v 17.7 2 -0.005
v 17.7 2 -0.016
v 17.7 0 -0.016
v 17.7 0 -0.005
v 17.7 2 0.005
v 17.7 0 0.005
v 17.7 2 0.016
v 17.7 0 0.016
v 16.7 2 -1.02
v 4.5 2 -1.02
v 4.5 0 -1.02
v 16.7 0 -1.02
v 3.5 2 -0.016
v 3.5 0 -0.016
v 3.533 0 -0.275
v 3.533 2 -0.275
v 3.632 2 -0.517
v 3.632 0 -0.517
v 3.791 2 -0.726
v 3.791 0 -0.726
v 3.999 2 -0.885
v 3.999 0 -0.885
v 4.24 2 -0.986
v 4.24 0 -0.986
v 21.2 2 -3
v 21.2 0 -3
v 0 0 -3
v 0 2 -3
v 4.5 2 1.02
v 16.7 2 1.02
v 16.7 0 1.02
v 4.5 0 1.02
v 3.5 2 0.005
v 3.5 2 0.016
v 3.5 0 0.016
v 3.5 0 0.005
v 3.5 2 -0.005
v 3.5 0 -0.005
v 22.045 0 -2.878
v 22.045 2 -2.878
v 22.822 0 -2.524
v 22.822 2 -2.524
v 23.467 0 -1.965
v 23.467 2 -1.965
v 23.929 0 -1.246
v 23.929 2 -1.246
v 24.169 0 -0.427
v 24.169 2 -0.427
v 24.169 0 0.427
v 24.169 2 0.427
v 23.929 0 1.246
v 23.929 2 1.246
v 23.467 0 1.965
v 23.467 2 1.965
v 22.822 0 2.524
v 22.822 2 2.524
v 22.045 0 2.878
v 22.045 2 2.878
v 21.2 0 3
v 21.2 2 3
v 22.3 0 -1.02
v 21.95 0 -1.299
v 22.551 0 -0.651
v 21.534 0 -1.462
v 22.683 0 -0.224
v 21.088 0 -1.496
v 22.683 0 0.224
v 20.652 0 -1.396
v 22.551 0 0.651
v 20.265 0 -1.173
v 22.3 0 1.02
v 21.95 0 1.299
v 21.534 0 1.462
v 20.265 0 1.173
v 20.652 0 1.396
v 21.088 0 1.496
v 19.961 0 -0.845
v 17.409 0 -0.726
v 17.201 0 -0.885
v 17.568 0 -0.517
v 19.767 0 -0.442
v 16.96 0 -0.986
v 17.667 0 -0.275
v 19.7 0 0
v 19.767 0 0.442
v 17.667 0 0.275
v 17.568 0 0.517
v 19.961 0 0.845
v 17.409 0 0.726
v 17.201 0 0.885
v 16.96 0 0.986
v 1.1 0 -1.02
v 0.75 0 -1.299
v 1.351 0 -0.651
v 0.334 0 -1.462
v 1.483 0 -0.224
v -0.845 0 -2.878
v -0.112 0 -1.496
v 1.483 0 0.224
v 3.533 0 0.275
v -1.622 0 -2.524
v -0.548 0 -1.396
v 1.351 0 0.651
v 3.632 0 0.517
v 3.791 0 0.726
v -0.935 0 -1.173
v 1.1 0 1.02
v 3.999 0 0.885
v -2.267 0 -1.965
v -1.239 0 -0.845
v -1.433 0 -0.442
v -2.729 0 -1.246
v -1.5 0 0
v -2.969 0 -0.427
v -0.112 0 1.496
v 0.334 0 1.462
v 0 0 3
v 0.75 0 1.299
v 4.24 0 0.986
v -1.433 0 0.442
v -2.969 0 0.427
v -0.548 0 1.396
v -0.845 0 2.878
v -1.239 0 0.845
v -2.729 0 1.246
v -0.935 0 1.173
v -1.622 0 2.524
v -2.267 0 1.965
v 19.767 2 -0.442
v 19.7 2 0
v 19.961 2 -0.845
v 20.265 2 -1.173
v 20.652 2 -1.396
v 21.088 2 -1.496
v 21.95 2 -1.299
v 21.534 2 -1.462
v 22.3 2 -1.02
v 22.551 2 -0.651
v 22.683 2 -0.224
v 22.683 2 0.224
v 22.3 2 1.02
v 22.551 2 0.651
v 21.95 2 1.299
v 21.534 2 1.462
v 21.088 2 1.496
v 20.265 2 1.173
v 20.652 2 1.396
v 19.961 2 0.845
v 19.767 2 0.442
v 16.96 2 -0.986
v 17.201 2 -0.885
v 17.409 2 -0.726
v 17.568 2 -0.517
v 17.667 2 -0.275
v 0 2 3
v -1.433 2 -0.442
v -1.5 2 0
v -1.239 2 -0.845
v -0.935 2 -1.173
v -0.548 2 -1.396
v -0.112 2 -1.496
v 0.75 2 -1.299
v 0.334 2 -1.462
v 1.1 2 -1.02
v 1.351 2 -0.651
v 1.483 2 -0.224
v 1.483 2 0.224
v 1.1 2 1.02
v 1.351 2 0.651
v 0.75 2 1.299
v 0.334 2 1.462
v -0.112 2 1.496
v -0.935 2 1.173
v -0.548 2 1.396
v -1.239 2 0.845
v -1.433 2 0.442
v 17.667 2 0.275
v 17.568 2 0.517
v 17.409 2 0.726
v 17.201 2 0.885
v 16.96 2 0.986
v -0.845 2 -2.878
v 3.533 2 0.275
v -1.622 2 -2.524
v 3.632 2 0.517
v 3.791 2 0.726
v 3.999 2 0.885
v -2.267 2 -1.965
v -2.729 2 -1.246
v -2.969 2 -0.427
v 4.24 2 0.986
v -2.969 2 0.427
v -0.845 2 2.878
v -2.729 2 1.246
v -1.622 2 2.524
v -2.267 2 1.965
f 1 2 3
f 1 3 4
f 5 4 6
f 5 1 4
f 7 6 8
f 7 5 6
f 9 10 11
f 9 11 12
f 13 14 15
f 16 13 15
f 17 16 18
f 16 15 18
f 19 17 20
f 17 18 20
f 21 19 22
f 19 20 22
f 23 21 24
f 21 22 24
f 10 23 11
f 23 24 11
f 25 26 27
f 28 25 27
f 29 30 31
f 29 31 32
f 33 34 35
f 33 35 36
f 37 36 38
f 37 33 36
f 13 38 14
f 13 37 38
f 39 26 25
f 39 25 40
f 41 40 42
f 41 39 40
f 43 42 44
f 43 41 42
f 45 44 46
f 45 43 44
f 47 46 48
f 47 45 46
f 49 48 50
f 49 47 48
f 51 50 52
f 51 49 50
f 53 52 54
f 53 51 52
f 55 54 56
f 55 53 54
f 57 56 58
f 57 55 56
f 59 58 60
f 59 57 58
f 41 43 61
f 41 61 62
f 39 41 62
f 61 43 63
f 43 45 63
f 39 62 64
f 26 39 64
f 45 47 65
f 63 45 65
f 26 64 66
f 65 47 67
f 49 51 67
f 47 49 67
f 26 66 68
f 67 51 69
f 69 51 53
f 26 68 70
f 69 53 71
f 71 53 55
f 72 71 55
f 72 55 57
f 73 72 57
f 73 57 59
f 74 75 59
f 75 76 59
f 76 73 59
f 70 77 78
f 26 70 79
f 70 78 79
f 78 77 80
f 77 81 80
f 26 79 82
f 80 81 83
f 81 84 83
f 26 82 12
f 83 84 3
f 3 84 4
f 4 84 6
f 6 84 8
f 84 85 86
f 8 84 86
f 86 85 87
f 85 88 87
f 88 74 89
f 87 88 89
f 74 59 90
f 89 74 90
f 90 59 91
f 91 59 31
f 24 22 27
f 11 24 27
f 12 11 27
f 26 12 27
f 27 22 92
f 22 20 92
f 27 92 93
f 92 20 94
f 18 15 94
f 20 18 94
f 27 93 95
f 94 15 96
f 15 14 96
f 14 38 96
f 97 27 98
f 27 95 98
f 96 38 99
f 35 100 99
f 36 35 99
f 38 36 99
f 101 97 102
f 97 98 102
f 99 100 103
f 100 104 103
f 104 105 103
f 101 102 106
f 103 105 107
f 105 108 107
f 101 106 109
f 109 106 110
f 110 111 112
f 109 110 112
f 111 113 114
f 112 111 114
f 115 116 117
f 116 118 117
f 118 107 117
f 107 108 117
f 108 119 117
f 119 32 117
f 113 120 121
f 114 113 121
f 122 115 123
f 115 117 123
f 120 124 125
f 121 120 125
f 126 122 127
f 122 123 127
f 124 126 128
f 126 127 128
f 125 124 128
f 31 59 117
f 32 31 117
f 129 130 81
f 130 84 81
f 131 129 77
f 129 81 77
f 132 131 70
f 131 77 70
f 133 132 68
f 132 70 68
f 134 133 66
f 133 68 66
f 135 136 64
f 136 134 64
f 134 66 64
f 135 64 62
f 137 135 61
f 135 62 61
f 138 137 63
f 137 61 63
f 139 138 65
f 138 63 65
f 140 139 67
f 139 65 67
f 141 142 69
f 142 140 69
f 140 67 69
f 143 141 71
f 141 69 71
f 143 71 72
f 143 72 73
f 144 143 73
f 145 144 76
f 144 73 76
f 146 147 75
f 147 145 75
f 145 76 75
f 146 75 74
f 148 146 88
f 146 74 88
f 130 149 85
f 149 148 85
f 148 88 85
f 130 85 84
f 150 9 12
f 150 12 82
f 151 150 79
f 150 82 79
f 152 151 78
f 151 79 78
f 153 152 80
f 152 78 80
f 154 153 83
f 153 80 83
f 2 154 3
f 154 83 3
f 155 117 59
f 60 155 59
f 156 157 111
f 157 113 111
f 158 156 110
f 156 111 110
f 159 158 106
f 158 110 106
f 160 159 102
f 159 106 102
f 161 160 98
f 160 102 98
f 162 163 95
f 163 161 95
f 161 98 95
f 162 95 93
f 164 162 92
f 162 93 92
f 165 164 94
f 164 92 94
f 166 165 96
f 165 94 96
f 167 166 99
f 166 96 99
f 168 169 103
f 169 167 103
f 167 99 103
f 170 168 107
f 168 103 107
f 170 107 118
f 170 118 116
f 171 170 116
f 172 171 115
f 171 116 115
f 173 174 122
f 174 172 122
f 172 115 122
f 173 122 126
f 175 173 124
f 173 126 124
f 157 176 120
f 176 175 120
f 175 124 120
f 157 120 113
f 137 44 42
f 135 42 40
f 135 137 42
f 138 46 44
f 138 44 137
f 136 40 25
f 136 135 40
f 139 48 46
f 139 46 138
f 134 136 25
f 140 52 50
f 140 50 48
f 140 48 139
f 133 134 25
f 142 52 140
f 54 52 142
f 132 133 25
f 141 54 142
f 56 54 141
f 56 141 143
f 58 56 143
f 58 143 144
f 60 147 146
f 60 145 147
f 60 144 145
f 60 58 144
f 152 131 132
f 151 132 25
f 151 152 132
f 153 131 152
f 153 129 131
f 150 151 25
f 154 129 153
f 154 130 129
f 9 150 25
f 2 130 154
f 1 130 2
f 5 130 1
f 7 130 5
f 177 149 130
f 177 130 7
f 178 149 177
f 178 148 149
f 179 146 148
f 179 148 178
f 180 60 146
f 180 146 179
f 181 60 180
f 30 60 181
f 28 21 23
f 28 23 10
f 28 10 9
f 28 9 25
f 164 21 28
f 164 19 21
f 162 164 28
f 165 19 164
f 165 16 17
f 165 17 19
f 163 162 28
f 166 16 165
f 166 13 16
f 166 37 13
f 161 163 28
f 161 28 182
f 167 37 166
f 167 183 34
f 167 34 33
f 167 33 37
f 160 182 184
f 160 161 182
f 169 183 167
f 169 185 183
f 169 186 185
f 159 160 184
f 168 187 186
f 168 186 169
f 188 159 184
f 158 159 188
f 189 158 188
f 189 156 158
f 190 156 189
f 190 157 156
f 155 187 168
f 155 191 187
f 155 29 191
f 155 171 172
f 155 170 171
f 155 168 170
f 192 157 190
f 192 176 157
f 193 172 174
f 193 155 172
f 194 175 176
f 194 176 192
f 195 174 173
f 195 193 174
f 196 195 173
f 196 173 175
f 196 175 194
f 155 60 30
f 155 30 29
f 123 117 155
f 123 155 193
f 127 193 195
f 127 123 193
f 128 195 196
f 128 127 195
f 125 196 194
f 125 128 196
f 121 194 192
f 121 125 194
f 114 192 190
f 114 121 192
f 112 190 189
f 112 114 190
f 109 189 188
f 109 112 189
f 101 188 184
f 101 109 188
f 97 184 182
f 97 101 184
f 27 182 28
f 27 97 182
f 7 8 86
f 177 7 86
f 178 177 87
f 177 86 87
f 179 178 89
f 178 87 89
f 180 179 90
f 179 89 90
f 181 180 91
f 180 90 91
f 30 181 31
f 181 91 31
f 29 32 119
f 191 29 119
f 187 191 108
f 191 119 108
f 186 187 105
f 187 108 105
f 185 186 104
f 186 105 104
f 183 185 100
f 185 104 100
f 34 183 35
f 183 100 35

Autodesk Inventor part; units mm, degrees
ref_plane "YZ Plane" through (0, 0, 0) normal (1, 0, 0) x (0, 1, 0)
ref_plane "XZ Plane" through (0, 0, 0) normal (0, 1, 0) x (-1, 0, 0)
ref_plane "XY Plane" through (0, 0, 0) normal (0, 0, 1) x (1, 0, 0)
sketch "スケッチ1" plane through (0, 0, 0) normal (0, 1, 0) x (-1, 0, 0)
  circle A0 centre (0, 0) radius 1.5
  line L0 (0, 0) -> (-21.2, 0) construction
  circle A1 centre (-21.2, 0) radius 1.5
  line L1 (0, 0) -> (-21.2, 0) construction
  line L2 (0, 3) -> (-21.2, 3)
  line L3 (-21.2, -3) -> (0, -3)
  arc A2 (0, -3) -> (0, 3) centre (0, 0) ccw
  arc A3 (-21.2, 3) -> (-21.2, -3) centre (-21.2, 0) ccw
  point P0 (-10.6, 0)
  dimension "d0" = 3
  dimension "d1" = 3
  dimension "d2" = 21.2
  dimension "d3" = 6
extrude "押し出し1" add sketch "スケッチ1" along normal blind 2
sketch "スケッチ2" plane through (0, 2, 0) normal (0, 1, 0) x (1, 0, 0)
  circle A0 centre (21.2, 0) radius 1.5 projected
  circle A1 centre (0, 0) radius 1.5 projected
  line L0 (0, -3) -> (21.2, -3) projected
  arc A2 (21.2, -3) -> (21.2, 3) centre (21.2, 0) ccw projected
  line L1 (21.2, 3) -> (0, 3) projected
  arc A3 (0, 3) -> (0, -3) centre (0, 0) ccw projected
  line L2 (3.3481, 1.02) -> (17.8519, 1.02)
  arc A4 (21.2, -1.5) -> (21.2, 1.5) centre (21.2, 0) ccw
  line L3 (17.8519, -1.02) -> (3.3481, -1.02)
  arc A5 (0, 1.5) -> (0, -1.5) centre (0, 0) ccw
  arc A6 (17.8519, 1.02) -> (17.8519, -1.02) centre (21.2, 0) ccw
  arc A7 (3.3481, -1.02) -> (3.3481, 1.02) centre (0, 0) ccw
  line L4 (0, -3) -> (21.2, -3) projected
  dimension "d8" = 1.98
  dimension "d12" = 1.98
  dimension "d13" = 2
  dimension "d14" = 2
extrude "押し出し2" cut sketch "スケッチ2" against normal blind 2 contours L2 A6 L3 A7
fillet "フィレット1" radius 1 4 edges at (3.3481, 1, 1.02) (3.3481, 1, -1.02) (17.8519, 1, 1.02) (17.8519, 1, -1.02)
properties part number "ウィングおさえ" material "ポリカーボネート、クリア"
